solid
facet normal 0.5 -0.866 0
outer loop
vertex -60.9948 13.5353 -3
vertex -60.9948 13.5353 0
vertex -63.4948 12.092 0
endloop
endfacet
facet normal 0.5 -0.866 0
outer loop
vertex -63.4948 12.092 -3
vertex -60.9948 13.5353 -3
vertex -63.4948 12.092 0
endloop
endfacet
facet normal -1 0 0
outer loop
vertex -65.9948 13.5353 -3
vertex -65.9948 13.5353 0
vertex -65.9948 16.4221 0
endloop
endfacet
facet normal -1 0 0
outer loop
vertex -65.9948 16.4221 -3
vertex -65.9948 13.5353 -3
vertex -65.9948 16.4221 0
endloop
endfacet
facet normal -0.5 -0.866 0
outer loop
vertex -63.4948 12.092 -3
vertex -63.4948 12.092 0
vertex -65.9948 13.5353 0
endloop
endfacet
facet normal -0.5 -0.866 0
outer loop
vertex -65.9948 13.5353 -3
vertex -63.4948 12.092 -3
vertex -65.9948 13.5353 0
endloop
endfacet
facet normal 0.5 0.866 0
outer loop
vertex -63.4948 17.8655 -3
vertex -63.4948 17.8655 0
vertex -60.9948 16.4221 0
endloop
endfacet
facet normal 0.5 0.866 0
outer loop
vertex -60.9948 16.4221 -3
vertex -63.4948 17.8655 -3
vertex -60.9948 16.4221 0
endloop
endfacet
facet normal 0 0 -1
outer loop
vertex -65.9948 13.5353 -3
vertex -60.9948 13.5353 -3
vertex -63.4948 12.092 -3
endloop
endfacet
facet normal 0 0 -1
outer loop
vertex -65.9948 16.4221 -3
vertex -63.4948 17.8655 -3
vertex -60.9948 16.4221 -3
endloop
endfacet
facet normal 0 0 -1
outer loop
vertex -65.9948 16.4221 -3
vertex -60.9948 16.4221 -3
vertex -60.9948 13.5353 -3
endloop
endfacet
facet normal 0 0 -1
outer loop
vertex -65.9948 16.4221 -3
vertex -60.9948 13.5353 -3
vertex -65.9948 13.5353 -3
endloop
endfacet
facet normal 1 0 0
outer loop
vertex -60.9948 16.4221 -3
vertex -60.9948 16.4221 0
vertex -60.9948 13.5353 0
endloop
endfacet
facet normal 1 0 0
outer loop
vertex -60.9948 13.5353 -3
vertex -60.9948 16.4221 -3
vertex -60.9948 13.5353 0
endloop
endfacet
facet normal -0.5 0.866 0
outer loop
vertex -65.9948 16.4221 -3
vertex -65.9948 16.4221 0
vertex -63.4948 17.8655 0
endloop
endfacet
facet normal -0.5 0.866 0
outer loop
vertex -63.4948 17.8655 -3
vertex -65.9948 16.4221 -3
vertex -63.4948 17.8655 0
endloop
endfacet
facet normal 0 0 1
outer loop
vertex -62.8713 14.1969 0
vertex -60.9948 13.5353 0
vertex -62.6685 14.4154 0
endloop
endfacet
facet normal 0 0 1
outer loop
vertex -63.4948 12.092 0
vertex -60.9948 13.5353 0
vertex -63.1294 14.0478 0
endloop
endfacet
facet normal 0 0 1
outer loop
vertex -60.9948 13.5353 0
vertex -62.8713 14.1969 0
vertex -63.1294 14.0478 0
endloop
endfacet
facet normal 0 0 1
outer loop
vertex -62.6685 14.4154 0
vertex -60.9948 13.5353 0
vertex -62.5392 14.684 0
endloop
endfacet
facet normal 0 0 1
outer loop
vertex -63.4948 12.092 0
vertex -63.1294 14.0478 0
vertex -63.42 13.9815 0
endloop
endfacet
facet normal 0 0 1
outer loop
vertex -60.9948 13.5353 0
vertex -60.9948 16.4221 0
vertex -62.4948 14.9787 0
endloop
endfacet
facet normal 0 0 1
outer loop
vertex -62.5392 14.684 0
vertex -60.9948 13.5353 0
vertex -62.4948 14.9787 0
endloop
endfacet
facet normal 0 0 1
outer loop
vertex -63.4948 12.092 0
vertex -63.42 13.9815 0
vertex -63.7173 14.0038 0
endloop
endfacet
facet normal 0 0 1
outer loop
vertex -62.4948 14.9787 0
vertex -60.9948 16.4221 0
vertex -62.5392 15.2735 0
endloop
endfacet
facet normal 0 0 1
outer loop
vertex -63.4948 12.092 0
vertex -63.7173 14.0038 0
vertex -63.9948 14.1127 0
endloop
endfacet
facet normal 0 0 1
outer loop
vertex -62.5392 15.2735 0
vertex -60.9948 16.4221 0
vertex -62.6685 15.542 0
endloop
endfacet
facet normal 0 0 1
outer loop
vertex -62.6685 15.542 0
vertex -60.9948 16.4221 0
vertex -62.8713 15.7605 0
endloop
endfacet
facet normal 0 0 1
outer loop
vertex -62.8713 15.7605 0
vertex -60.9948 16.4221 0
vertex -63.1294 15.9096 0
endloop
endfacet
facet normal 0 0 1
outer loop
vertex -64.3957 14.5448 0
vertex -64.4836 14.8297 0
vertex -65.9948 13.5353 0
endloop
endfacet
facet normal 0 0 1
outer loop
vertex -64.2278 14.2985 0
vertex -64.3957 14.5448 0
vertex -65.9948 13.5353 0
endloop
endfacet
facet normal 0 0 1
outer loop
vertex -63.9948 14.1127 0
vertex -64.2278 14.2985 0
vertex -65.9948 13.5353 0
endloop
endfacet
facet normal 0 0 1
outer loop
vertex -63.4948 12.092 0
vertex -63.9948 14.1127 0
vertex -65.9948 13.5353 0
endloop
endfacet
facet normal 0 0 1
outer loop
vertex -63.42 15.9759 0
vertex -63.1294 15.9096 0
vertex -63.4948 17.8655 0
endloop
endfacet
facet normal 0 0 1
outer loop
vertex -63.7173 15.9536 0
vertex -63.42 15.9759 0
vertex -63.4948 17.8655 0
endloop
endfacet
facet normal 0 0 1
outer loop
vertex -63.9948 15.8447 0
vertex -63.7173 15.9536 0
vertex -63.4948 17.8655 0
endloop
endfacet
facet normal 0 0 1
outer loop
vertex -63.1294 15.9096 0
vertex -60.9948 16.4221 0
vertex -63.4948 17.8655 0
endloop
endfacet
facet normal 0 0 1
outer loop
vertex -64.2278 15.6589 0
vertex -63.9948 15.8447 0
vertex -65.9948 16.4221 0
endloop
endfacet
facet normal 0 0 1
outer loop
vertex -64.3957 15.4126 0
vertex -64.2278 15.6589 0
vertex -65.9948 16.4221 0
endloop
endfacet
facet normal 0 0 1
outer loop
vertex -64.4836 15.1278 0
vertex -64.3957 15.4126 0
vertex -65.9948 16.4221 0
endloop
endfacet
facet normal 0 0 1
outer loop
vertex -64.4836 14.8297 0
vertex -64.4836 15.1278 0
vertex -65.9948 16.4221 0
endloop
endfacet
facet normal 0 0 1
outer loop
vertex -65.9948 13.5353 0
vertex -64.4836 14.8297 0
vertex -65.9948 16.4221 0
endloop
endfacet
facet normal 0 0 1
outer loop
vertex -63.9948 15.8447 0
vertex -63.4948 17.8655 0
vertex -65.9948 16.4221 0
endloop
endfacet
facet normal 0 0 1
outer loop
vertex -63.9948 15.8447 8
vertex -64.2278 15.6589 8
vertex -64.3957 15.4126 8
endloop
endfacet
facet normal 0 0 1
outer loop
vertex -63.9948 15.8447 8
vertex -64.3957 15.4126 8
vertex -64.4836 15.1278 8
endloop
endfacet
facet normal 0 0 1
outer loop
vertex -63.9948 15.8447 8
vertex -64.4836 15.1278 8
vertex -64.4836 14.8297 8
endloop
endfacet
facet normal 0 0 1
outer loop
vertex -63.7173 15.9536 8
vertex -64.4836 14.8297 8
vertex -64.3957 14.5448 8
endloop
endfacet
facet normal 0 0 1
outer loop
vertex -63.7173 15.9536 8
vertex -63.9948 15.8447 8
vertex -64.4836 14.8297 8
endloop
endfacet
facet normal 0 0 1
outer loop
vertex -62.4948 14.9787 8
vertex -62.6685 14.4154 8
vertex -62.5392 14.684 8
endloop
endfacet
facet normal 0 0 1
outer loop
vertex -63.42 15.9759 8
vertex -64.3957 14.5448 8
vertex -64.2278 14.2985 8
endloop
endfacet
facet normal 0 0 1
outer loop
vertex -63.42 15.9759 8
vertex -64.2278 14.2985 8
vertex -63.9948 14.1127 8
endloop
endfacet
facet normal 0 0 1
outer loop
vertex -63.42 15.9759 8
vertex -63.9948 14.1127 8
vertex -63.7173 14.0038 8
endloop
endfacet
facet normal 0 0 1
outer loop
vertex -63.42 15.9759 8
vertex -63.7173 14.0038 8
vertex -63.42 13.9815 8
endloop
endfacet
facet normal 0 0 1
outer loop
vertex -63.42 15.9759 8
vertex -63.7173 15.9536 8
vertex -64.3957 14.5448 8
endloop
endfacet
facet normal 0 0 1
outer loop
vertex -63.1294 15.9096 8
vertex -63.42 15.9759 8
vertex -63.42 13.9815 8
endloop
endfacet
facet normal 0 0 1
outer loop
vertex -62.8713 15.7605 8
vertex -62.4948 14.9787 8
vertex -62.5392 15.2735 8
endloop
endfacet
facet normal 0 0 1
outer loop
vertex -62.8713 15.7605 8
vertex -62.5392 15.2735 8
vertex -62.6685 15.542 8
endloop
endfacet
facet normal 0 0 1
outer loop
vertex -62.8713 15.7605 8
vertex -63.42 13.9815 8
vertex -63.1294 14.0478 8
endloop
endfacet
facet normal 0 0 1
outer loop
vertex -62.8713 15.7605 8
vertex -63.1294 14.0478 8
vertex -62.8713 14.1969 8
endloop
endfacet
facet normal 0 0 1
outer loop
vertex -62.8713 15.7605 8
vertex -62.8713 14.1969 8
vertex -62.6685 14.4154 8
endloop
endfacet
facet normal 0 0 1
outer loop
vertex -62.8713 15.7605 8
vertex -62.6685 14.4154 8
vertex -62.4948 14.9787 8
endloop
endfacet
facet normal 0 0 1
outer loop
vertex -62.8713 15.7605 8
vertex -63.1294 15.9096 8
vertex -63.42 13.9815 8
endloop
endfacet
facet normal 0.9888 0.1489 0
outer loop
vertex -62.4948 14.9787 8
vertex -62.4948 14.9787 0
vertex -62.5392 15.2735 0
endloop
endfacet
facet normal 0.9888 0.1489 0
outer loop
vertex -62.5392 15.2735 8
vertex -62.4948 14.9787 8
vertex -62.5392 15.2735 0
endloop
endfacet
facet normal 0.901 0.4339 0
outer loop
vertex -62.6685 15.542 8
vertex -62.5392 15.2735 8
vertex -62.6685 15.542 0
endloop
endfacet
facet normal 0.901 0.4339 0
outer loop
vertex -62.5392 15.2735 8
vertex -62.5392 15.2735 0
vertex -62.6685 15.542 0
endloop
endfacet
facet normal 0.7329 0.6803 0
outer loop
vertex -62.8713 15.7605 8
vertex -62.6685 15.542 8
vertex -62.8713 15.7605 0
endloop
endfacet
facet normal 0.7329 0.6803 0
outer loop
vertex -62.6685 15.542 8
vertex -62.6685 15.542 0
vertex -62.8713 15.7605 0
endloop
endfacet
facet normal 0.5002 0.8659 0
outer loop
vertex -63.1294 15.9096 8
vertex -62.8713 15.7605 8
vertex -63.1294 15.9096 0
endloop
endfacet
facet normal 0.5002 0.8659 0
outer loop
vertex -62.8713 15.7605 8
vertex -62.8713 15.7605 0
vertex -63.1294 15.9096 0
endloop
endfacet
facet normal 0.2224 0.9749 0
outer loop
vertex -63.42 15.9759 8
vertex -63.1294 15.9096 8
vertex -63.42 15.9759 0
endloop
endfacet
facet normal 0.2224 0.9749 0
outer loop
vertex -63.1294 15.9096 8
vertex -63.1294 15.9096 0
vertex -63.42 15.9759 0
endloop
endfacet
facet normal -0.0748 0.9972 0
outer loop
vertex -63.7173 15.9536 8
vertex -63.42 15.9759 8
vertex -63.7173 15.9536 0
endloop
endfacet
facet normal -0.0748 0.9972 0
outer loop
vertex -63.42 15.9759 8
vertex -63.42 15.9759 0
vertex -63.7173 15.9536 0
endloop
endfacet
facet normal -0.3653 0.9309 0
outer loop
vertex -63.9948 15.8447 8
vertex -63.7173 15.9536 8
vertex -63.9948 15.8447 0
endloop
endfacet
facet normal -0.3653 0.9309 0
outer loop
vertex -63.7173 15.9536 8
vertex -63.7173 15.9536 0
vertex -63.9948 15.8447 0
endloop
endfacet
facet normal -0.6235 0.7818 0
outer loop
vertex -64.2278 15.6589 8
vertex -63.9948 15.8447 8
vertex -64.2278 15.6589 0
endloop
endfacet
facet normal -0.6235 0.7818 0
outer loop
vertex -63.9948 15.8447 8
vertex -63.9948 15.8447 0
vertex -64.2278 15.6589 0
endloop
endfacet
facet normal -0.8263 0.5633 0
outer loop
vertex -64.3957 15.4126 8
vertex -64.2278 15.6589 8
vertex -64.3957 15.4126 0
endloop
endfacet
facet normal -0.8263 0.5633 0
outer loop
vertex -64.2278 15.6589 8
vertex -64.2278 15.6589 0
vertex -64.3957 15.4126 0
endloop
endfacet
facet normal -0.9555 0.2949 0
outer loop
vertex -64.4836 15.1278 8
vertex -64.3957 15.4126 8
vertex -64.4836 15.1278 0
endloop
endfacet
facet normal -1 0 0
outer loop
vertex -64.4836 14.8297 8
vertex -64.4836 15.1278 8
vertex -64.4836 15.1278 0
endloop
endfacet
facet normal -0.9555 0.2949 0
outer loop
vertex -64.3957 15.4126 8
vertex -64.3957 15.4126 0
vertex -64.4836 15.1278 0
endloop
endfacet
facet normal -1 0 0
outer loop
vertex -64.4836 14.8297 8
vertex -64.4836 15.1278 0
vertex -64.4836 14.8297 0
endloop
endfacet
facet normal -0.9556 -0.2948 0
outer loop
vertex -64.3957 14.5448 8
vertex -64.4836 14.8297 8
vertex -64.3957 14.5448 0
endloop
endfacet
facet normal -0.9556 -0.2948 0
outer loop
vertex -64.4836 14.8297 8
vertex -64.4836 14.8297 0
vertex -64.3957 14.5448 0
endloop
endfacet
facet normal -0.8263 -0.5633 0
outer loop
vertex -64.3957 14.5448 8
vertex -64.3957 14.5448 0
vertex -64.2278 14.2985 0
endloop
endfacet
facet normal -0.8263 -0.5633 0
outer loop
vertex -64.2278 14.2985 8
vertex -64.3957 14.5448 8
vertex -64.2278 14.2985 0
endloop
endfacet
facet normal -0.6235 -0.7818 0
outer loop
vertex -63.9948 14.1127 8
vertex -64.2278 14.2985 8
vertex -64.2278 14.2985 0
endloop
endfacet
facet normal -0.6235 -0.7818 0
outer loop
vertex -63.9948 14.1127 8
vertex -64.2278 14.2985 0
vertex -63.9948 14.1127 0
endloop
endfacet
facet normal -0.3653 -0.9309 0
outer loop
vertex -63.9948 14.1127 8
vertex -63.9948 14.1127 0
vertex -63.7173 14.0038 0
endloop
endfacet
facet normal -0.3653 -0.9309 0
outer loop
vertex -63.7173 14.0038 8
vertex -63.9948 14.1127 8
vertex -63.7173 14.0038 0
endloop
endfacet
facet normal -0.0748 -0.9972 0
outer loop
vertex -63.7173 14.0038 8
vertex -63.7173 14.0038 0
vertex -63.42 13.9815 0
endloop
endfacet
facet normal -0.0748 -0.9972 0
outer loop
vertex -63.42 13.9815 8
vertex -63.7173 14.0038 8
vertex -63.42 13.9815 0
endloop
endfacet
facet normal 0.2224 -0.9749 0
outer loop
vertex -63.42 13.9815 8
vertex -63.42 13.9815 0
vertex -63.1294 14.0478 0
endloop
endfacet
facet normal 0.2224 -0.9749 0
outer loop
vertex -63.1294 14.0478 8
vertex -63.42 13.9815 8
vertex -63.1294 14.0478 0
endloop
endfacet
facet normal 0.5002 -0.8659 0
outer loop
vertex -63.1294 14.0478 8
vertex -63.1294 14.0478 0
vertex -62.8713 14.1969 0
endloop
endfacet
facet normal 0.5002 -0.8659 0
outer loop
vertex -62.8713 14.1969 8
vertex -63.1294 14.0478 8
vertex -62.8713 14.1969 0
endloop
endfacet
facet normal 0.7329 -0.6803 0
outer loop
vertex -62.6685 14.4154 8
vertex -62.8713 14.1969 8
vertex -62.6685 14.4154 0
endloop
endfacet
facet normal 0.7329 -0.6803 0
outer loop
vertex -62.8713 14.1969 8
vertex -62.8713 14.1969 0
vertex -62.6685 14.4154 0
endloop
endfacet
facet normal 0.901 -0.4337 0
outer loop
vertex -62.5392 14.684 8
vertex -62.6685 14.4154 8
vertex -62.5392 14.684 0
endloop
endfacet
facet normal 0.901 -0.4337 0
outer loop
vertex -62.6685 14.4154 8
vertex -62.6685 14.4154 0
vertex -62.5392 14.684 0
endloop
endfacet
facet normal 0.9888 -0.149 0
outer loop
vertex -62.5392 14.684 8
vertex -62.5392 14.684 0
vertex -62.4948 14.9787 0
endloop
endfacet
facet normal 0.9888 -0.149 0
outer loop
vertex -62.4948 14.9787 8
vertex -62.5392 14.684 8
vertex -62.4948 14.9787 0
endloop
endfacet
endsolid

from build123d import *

# Parameters (mm, degrees)
SKETCH1_R           = 1
BOSS_EXTRUDE1_DEPTH = 8
BOSS_EXTRUDE2_DEPTH = 3


with BuildPart() as part:
    # Sketch1 → Boss-Extrude1 (new body)
    with BuildSketch(Plane.XY):
        with Locations((-63.49476159, 14.978708134)):
            Circle(SKETCH1_R)
    extrude(amount=BOSS_EXTRUDE1_DEPTH)

    # Sketch2 → Boss-Extrude2 (add)
    with BuildSketch(Plane(origin=(0, 0, 0), x_dir=(-1, 0, 0), z_dir=(0, 0, -1))):
        Polygon((63.49476159, 12.091956788), (65.99476159, 13.535332461), (65.99476159, 16.422083807), (63.49476159, 17.86545948), (60.99476159, 16.422083807), (60.99476159, 13.535332461), align=None)
    extrude(amount=BOSS_EXTRUDE2_DEPTH)


solid = part.part
